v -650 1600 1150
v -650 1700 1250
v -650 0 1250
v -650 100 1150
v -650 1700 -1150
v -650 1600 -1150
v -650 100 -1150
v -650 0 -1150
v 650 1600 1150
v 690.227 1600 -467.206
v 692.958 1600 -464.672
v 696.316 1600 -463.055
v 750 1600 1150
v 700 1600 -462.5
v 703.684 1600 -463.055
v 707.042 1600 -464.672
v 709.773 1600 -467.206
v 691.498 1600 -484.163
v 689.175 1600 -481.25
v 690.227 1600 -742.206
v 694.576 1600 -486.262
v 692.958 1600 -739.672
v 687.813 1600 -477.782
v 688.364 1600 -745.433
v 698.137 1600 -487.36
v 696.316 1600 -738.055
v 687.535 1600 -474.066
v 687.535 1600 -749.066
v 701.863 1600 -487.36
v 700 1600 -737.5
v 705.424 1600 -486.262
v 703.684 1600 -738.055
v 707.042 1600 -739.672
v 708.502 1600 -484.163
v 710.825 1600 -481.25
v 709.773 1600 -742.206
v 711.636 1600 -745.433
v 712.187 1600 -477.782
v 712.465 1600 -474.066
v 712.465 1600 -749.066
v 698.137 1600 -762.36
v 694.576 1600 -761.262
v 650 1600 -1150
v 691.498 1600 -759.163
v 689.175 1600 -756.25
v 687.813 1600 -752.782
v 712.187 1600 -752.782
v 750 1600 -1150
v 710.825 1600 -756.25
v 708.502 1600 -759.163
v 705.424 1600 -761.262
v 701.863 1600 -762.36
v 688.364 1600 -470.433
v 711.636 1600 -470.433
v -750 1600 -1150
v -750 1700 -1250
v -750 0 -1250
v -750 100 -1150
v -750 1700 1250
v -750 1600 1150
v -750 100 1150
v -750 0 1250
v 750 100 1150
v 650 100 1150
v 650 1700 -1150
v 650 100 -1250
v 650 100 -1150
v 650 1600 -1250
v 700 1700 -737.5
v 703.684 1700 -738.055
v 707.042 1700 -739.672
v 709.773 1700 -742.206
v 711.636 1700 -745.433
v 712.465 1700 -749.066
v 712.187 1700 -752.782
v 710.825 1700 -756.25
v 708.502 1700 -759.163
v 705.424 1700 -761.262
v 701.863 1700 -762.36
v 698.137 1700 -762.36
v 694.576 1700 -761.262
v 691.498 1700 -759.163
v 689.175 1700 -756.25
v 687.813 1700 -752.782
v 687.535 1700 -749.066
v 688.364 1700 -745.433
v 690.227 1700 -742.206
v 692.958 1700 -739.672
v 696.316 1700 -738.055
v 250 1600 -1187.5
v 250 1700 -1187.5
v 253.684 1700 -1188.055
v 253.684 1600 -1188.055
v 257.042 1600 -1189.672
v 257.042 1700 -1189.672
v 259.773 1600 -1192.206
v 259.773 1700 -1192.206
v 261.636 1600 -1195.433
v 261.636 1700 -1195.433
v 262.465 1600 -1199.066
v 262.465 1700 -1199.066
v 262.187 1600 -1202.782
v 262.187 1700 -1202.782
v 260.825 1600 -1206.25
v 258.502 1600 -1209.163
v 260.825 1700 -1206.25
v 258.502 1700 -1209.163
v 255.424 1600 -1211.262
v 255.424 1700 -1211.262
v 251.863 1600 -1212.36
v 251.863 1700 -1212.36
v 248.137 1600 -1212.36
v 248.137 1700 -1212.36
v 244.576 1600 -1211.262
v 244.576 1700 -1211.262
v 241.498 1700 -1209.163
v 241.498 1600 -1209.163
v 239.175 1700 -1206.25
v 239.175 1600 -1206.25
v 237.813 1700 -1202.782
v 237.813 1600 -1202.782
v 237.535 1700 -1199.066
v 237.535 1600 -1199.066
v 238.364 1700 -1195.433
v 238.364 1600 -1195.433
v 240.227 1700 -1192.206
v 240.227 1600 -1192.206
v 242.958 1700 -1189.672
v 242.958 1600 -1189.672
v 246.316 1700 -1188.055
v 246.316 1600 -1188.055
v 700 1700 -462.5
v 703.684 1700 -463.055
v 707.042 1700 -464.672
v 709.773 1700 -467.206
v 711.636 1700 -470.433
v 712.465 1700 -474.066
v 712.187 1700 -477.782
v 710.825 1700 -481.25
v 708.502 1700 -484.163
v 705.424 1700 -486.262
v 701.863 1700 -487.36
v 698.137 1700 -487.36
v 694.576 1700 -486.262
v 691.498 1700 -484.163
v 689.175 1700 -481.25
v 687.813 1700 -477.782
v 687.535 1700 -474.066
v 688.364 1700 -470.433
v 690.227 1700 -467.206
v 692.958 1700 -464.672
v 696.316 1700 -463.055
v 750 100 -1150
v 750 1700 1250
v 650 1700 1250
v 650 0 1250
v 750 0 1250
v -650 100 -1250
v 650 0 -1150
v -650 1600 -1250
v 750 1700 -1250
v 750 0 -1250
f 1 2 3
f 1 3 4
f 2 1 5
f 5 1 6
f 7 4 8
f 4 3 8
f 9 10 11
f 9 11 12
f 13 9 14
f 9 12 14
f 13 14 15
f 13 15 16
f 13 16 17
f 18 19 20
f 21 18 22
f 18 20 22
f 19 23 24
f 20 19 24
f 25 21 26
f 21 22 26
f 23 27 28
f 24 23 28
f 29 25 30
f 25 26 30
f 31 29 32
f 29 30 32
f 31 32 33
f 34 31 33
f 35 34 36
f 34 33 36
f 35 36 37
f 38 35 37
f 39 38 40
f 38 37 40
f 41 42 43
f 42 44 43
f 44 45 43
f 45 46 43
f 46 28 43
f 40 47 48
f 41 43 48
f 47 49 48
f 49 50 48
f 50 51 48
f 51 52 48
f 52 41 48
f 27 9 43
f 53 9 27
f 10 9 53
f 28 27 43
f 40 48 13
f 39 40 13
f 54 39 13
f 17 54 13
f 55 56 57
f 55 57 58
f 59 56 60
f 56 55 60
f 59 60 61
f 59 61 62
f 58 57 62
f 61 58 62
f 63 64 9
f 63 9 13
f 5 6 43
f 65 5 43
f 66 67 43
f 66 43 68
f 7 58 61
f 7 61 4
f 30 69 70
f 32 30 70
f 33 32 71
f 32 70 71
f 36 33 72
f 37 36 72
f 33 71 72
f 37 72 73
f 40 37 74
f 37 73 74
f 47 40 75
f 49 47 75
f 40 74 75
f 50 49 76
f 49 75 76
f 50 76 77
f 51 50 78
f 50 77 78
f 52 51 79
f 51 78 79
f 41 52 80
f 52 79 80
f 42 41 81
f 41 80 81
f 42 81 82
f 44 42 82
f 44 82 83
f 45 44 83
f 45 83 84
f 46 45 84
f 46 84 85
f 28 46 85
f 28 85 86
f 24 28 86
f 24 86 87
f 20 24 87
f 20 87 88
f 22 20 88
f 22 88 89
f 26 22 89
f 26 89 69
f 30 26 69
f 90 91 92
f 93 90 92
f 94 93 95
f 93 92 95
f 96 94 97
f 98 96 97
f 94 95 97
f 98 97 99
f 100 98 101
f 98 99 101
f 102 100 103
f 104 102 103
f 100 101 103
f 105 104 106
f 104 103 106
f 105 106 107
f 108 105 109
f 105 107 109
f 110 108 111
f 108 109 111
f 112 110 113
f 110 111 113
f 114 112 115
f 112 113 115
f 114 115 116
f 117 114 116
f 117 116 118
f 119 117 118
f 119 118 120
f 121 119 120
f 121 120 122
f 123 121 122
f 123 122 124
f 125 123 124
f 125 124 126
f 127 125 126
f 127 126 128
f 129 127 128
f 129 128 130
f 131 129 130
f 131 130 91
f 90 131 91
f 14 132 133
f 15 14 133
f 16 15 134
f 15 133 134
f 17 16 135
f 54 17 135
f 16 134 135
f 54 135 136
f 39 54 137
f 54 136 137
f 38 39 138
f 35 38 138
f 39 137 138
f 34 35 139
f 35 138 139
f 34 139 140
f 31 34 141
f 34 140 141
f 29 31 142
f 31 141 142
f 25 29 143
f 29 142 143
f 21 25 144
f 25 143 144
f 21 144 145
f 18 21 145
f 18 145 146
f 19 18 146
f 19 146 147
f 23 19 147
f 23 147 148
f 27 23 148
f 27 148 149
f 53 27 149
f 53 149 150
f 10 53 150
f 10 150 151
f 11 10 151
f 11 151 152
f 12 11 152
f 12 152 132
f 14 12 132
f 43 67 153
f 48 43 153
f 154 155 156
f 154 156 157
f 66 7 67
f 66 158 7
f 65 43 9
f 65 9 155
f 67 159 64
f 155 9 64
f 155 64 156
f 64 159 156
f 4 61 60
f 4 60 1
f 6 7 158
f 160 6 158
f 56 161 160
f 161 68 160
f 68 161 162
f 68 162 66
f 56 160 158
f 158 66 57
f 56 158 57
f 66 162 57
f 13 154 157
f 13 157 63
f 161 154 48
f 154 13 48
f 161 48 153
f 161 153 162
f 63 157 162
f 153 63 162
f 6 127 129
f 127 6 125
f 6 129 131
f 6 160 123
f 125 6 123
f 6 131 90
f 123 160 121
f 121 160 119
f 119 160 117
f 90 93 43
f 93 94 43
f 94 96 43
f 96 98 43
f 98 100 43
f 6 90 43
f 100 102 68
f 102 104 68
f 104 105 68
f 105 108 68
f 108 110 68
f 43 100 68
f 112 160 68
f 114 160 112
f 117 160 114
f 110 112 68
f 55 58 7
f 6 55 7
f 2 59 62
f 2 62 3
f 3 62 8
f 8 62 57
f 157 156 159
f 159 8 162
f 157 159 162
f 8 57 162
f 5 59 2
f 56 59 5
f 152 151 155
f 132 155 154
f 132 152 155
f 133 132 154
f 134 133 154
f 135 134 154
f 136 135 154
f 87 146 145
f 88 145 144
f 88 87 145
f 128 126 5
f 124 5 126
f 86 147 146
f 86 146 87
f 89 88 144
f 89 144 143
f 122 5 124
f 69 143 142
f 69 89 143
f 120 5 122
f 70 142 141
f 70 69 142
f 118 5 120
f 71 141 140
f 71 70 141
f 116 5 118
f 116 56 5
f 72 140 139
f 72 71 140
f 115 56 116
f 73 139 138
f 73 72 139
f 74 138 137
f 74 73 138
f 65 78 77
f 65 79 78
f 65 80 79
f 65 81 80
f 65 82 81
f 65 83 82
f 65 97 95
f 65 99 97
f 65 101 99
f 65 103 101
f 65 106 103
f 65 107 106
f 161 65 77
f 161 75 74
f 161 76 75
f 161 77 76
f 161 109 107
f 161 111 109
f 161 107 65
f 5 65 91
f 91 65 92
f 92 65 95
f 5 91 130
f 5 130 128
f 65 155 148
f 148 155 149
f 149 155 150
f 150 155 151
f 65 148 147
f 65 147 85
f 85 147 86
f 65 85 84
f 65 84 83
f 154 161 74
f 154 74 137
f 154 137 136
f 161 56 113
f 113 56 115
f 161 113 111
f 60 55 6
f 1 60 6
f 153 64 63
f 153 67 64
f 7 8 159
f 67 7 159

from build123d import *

# Parameters (mm, degrees)
EXTRUDE_THIN1_DEPTH = 100
SKETCH3_W           = 100
SKETCH3_H           = 100
BOSS_EXTRUDE1_DEPTH = 1500
SKETCH5_W           = 100
SKETCH5_H           = 100
SKETCH5_H_2         = 2300
BOSS_EXTRUDE2_DEPTH = 100
CUT_EXTRUDE1_REACH  = 2241.42
SKETCH8_R           = 12.5
CUT_EXTRUDE2_REACH  = 2241.42
SKETCH9_R           = 12.5


with BuildPart() as part:
    # Sketch2 → Extrude-Thin1 (new body)
    with BuildSketch(Plane(origin=(0, 0, 0), x_dir=(1, 0, 0), z_dir=(0, 1, 0))):
        Polygon((750, -1250), (750, 1250), (-750, 1250), (-750, -1250), (-650, -1250), (-650, 1150), (650, 1150), (650, -1250), align=None)
    extrude(amount=EXTRUDE_THIN1_DEPTH)

    # Sketch3 → Boss-Extrude1 (add)
    with BuildSketch(Plane(origin=(0, 100, 0), x_dir=(1, 0, 0), z_dir=(0, 1, 0))):
        with Locations((700, 1200)):
            Rectangle(SKETCH3_W, SKETCH3_H)
        with Locations((-700, 1200)):
            Rectangle(SKETCH3_W, SKETCH3_H)
        with Locations((-700, -1200)):
            Rectangle(SKETCH3_W, SKETCH3_H)
        with Locations((700, -1200)):
            Rectangle(SKETCH3_W, SKETCH3_H)
    extrude(amount=BOSS_EXTRUDE1_DEPTH)

    # Sketch5 → Boss-Extrude2 (add)
    with BuildSketch(Plane(origin=(0, 1600, 0), x_dir=(1, 0, 0), z_dir=(0, 1, 0))):
        Polygon((-650, 1150), (650, 1150), (750, 1150), (750, 1250), (650, 1250), (-650, 1250), align=None)
        Polygon((-650, -1250), (-650, -1150), (-650, 1150), (-750, 1150), (-750, -1150), (-750, -1250), align=None)
        with Locations((-700, 1200)):
            Rectangle(SKETCH5_W, SKETCH5_H)
        with Locations((700, 0)):
            Rectangle(SKETCH5_W, SKETCH5_H_2)
        with Locations((700, -1200)):
            Rectangle(SKETCH5_W, SKETCH5_H)
    extrude(amount=BOSS_EXTRUDE2_DEPTH)

    # Sketch8 → Cut-Extrude1 (cut, up to next)
    with BuildSketch(Plane(origin=(0, 1700, 0), x_dir=(1, 0, 0), z_dir=(0, 1, 0)), mode=Mode.PRIVATE) as cut_extrude1_sk1:
        with Locations(Location((700, 750, 0), (0, 0, 270))):
            Circle(SKETCH8_R)
    cut_extrude1_tool1 = extrude(cut_extrude1_sk1.sketch, amount=-CUT_EXTRUDE1_REACH, mode=Mode.PRIVATE) & part.part
    # Sketch8 → Cut-Extrude1 (cut, up to next)
    with BuildSketch(Plane(origin=(0, 1700, 0), x_dir=(1, 0, 0), z_dir=(0, 1, 0)), mode=Mode.PRIVATE) as cut_extrude1_sk2:
        with Locations(Location((250, 1200, 0), (0, 0, 270))):
            Circle(SKETCH8_R)
    cut_extrude1_tool2 = extrude(cut_extrude1_sk2.sketch, amount=-CUT_EXTRUDE1_REACH, mode=Mode.PRIVATE) & part.part
    add(cut_extrude1_tool1.solids().sort_by_distance((700, 1700, -750))[0], mode=Mode.SUBTRACT)
    add(cut_extrude1_tool2.solids().sort_by_distance((250, 1700, -1200))[0], mode=Mode.SUBTRACT)

    # Sketch9 → Cut-Extrude2 (cut, up to next)
    with BuildSketch(Plane(origin=(0, 1700, 0), x_dir=(1, 0, 0), z_dir=(0, 1, 0)), mode=Mode.PRIVATE) as cut_extrude2_sk1:
        with Locations(Location((700, 475, 0), (0, 0, 270))):
            Circle(SKETCH9_R)
    cut_extrude2_tool1 = extrude(cut_extrude2_sk1.sketch, amount=-CUT_EXTRUDE2_REACH, mode=Mode.PRIVATE) & part.part
    add(cut_extrude2_tool1.solids().sort_by_distance((700, 1700, -475))[0], mode=Mode.SUBTRACT)


solid = part.part
